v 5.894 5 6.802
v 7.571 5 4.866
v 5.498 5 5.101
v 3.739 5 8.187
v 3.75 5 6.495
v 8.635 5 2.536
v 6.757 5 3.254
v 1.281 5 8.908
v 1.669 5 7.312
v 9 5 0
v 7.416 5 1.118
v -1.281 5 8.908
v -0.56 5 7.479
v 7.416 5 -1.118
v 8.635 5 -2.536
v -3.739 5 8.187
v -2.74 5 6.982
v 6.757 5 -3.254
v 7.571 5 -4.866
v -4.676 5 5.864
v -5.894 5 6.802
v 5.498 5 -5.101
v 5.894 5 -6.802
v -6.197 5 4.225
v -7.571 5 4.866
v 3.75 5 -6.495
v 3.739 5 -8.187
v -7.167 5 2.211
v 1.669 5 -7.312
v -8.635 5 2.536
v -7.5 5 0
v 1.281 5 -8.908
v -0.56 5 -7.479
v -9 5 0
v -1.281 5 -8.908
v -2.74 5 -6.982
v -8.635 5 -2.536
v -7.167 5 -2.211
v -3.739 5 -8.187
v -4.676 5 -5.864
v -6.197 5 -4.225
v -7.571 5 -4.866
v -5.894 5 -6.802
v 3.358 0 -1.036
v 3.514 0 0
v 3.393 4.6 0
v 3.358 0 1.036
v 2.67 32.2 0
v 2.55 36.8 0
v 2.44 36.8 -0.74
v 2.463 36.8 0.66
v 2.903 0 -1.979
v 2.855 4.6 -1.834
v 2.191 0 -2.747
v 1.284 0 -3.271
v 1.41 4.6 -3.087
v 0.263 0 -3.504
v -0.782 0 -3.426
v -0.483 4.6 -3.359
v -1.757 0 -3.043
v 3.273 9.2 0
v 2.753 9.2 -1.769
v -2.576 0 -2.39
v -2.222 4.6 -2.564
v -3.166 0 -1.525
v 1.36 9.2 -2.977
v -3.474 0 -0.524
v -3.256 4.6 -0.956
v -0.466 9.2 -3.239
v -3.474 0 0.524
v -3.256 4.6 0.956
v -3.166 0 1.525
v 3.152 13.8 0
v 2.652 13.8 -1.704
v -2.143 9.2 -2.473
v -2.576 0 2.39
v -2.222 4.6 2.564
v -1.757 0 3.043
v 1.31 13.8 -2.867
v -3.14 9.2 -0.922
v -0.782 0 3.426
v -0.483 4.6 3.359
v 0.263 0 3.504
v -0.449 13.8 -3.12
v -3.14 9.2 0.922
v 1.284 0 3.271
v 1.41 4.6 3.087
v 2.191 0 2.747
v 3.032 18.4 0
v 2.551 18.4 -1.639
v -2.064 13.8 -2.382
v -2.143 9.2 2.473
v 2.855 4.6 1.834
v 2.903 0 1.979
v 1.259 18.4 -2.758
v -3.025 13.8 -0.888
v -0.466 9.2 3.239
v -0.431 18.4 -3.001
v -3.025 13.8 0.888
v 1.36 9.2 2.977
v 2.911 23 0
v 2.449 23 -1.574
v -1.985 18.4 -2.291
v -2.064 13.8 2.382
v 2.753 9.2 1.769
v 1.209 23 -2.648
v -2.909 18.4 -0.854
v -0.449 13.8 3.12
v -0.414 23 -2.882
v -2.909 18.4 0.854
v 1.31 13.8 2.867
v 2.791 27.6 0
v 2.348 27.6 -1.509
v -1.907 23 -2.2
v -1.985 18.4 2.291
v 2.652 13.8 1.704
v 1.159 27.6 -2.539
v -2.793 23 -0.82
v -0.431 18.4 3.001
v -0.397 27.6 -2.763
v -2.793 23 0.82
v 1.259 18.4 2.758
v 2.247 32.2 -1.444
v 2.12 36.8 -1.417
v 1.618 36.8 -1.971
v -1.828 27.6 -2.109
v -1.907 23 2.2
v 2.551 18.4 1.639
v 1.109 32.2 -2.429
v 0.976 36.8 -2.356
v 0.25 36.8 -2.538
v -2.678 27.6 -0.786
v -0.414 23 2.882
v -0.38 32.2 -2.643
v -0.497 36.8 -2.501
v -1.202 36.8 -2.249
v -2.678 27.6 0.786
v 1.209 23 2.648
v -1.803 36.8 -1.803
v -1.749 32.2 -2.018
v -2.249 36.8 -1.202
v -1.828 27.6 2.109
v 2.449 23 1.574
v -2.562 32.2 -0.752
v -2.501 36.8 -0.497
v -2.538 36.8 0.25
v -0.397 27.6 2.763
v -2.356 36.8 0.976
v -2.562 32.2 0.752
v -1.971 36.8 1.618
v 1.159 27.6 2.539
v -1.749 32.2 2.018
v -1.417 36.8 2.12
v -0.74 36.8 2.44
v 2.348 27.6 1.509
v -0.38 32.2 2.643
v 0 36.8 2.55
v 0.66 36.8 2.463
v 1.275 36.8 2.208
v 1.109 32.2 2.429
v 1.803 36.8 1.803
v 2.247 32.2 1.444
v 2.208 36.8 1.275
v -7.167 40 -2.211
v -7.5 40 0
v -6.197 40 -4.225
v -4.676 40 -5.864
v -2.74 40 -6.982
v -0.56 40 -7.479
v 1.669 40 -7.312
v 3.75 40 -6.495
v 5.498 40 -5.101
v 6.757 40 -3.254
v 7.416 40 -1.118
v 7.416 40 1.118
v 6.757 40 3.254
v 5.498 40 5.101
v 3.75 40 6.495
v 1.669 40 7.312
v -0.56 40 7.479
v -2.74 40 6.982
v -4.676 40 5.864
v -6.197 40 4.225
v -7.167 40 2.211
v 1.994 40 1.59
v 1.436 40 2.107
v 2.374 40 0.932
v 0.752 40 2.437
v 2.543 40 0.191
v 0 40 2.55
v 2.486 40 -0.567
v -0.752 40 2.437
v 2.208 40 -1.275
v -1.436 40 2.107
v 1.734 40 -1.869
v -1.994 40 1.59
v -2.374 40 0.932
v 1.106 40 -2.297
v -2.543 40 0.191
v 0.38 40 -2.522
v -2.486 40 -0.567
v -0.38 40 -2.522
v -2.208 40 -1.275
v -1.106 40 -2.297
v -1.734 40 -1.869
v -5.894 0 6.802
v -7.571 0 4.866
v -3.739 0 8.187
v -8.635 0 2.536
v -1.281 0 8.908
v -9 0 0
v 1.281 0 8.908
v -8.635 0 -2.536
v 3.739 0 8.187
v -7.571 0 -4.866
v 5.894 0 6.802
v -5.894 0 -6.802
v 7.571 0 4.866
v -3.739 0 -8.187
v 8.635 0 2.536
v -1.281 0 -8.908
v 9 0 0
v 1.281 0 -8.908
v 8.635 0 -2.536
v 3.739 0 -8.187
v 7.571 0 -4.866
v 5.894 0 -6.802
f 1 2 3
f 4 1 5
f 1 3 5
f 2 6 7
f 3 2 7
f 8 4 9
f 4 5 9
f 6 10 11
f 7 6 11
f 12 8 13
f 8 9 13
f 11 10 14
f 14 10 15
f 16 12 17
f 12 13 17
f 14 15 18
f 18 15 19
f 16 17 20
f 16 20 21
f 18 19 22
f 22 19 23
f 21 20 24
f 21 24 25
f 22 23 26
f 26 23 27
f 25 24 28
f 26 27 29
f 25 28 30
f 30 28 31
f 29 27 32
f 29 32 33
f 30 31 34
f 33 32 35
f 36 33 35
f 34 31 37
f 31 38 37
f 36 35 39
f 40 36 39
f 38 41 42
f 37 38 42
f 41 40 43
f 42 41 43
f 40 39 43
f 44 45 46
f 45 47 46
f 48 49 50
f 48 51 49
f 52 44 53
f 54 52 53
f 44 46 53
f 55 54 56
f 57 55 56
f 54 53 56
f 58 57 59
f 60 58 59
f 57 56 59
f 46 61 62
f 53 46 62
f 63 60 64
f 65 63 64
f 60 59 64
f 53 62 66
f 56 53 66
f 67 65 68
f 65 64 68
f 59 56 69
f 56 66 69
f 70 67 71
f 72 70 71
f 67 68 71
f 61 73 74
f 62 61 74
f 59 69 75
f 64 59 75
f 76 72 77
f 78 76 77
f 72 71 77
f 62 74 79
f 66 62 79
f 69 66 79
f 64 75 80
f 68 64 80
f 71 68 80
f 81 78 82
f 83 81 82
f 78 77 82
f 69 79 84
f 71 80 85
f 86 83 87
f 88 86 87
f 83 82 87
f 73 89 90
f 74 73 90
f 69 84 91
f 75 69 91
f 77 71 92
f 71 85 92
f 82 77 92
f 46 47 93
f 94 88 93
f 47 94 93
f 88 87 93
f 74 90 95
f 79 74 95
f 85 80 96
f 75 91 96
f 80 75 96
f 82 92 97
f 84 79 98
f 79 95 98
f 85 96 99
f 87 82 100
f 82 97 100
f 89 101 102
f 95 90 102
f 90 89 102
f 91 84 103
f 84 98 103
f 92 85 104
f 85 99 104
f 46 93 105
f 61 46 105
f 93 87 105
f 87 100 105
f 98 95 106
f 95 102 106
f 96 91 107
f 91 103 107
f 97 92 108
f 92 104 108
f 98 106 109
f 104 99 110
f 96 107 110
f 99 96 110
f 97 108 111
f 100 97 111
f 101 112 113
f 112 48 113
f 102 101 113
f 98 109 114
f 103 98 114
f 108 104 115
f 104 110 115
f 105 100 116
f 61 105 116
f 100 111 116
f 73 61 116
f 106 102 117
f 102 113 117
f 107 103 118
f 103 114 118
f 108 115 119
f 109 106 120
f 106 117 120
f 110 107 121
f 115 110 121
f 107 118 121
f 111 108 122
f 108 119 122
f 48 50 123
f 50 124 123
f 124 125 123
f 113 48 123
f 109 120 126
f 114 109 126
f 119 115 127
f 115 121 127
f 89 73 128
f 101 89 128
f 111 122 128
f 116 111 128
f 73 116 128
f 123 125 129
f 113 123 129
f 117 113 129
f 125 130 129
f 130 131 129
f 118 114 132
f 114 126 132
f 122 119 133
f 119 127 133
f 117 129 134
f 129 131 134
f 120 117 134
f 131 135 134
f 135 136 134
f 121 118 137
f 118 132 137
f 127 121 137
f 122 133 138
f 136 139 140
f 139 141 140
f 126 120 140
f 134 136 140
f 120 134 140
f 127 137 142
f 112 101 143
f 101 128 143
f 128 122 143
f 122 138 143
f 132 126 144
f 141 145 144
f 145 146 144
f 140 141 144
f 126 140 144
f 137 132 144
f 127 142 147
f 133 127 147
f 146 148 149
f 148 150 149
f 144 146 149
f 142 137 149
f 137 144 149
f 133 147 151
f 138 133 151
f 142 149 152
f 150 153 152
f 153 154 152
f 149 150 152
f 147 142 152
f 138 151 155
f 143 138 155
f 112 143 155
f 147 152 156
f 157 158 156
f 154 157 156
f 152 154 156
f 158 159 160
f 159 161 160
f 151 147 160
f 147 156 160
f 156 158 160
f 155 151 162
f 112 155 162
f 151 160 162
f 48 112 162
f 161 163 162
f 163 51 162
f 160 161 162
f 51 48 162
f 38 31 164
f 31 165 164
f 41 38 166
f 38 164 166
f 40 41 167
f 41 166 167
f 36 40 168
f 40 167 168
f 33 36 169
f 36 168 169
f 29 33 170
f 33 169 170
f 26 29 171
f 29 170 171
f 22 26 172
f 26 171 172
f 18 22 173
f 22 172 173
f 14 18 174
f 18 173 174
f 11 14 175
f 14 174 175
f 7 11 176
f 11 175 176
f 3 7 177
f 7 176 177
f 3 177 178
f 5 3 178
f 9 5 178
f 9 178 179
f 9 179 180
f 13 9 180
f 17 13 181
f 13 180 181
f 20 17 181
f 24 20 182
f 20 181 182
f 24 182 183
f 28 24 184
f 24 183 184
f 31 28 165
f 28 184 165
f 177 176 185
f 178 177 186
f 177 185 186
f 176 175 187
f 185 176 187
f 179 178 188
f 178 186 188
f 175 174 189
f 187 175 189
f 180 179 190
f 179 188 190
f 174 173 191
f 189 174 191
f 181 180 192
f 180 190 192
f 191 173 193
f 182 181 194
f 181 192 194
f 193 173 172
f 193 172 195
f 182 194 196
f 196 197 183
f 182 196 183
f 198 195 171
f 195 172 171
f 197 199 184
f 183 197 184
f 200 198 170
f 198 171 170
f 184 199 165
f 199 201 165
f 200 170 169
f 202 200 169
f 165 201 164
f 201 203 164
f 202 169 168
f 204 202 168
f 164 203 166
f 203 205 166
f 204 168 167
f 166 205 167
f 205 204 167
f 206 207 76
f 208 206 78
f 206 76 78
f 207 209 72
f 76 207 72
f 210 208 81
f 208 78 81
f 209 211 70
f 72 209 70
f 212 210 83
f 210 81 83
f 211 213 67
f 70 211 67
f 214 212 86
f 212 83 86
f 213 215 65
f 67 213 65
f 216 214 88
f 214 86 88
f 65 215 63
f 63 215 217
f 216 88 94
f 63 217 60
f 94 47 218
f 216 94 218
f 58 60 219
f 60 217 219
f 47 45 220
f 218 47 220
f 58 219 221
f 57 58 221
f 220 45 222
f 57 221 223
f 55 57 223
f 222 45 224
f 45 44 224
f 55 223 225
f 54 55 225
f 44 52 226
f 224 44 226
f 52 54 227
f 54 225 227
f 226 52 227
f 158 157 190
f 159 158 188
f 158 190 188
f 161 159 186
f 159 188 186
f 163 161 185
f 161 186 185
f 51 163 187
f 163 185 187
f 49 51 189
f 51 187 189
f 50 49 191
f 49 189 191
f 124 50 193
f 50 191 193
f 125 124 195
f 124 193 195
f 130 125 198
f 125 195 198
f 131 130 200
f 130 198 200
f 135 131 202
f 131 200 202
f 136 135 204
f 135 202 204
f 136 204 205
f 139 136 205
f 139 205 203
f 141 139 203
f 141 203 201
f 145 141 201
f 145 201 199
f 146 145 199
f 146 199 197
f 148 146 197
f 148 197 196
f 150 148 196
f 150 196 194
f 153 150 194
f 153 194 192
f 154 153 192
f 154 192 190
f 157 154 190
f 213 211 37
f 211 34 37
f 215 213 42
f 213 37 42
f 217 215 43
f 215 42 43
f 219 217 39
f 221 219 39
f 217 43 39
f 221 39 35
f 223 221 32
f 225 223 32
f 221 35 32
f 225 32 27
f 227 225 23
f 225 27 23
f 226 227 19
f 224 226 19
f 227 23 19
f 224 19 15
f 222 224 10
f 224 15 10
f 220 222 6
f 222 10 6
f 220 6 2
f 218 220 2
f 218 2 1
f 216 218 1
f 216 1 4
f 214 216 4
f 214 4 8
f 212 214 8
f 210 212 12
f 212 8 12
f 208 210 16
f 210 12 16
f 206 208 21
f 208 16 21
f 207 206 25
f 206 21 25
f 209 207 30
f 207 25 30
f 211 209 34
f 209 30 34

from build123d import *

# Parameters (mm, degrees)
CUT_EXTRUDE1_REACH = 43.976
SKETCH2_R          = 2.55


with BuildPart() as part:
    # Sketch1 → Revolve1 (revolve)
    with BuildSketch(Plane.XY, mode=Mode.PRIVATE) as revolve1_sk:
        Polygon((0, 0), (9, 0), (9, 5), (7.5, 5), (7.5, 40), (0, 40), align=None)
    revolve(revolve1_sk.sketch.rotate(Axis((0, 45, 0), (0, -1, 0)), 180), axis=Axis((0, 45, 0), (0, -1, 0)))

    # Sketch2 → Cut-Extrude1 (cut, up to next)
    with BuildSketch(Plane(origin=(0, 40, 0), x_dir=(1, 0, 0), z_dir=(0, 1, 0)), mode=Mode.PRIVATE) as cut_extrude1_sk1:
        with Locations(Location((0, 0, 0), (0, 0, 270))):
            Circle(SKETCH2_R)
    cut_extrude1_tool1 = extrude(cut_extrude1_sk1.sketch, amount=-CUT_EXTRUDE1_REACH, mode=Mode.PRIVATE) & part.part
    add(cut_extrude1_tool1.solids().sort_by_distance((0, 40, 0))[0], mode=Mode.SUBTRACT)

    # Cut-Sweep1: sweep along a path in Sketch5
    with BuildLine(Plane(origin=(0, 40, 0), x_dir=(1, 0, 0), z_dir=(0, 1, 0))) as cut_sweep1_path:
        CenterArc((0, 0), 2.55, 0, 360)
    # Sketch3 → Cut-Sweep1 (sweep, cut)
    with BuildSketch(Plane.XY):
        Polygon((2.55, 36.8), (3.513641914, 0), (2.55, 0), align=None)
    sweep(path=cut_sweep1_path.line, mode=Mode.SUBTRACT)


solid = part.part
